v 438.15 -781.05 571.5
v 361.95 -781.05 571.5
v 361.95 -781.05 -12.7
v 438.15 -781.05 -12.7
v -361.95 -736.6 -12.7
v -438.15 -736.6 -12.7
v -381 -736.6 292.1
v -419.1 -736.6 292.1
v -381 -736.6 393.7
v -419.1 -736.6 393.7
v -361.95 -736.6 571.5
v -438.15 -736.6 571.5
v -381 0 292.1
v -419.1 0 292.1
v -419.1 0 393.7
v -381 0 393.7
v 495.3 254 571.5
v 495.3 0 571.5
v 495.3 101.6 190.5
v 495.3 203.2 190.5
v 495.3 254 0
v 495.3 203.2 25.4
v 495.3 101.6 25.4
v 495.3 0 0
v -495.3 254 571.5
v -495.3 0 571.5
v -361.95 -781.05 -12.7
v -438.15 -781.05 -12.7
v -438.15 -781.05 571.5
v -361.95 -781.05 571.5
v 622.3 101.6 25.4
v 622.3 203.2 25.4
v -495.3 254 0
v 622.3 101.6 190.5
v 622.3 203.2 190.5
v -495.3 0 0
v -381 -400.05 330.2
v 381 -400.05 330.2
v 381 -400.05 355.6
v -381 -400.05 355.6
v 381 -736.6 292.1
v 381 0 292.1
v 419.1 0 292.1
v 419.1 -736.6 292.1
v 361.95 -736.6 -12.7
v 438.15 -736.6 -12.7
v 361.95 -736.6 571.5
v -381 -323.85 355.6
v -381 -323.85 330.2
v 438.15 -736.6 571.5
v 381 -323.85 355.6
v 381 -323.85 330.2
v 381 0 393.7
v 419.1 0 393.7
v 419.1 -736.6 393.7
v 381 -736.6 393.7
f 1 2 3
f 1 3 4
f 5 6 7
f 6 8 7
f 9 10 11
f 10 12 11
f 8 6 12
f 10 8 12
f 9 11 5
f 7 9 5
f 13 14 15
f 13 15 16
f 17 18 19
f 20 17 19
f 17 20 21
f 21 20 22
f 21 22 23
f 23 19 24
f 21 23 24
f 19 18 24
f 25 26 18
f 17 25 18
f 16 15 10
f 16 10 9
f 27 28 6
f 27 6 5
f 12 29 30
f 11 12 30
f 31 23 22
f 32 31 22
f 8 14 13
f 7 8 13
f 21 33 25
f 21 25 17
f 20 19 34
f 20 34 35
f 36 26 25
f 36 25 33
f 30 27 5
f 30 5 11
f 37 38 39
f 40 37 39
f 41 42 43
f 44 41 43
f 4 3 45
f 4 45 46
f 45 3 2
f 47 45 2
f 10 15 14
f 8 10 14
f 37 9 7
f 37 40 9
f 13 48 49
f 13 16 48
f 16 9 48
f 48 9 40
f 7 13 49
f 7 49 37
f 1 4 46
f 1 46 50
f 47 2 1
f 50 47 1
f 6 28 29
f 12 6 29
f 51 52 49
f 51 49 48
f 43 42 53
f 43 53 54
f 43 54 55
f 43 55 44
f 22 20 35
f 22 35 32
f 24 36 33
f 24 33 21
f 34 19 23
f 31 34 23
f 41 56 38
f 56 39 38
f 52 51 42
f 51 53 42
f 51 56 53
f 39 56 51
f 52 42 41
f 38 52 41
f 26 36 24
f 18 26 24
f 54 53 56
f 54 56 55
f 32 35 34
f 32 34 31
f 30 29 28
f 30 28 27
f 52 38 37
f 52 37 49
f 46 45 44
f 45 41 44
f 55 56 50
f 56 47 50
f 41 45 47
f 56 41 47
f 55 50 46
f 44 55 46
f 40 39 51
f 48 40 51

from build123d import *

# Parameters (mm, degrees)
SKETCH1_W             = 990.6
SKETCH1_H             = 571.5
BOSS_EXTRUDE1_DEPTH   = 254
SKETCH3_W             = 165.1
SKETCH3_H             = 101.6
BOSS_EXTRUDE2_DEPTH   = 127
SKETCH4_W             = 38.1
SKETCH4_H             = 101.6
BOSS_EXTRUDE3_DEPTH   = 781.05
BOSS_EXTRUDE3_2_DEPTH = 781.05
SKETCH5_W             = 25.4
SKETCH5_H             = 76.2
BOSS_EXTRUDE4_DEPTH   = 762
SKETCH6_W             = 76.2
SKETCH6_H             = 584.2
BOSS_EXTRUDE5_DEPTH   = 44.45


with BuildPart() as part:
    # Sketch1 → Boss-Extrude1 (new body)
    with BuildSketch(Plane(origin=(0, 0, 0), x_dir=(1, 0, 0), z_dir=(0, 1, 0))):
        with Locations((0, -285.75)):
            Rectangle(SKETCH1_W, SKETCH1_H)
    extrude(amount=BOSS_EXTRUDE1_DEPTH)

    # Sketch3 → Boss-Extrude2 (add)
    with BuildSketch(Plane(origin=(495.3, 0, 0), x_dir=(0, 0, -1), z_dir=(1, 0, 0))):
        with Locations((-107.95, 152.4)):
            Rectangle(SKETCH3_W, SKETCH3_H)
    extrude(amount=BOSS_EXTRUDE2_DEPTH)


with BuildPart() as body_2:
    # Sketch4 → Boss-Extrude3 (new body)
    with BuildSketch(Plane(origin=(0, 0, 0), x_dir=(1, 0, 0), z_dir=(0, 1, 0))):
        with Locations((400.05, -342.9)):
            Rectangle(SKETCH4_W, SKETCH4_H)
    extrude(amount=-BOSS_EXTRUDE3_DEPTH)



with BuildPart() as body_3:
    # Sketch4 → Boss-Extrude3 2 (new body)
    with BuildSketch(Plane(origin=(0, 0, 0), x_dir=(1, 0, 0), z_dir=(0, 1, 0))):
        with Locations((-400.05, -342.9)):
            Rectangle(SKETCH4_W, SKETCH4_H)
    extrude(amount=-BOSS_EXTRUDE3_2_DEPTH)


with BuildPart() as body_2_1:
    add(body_2.part)

    add(body_3.part)  # Boss-Extrude4 merges body 3
    # Sketch5 → Boss-Extrude4 (add)
    with BuildSketch(Plane.ZY.offset(-381)):
        with Locations((342.9, -361.95)):
            Rectangle(SKETCH5_W, SKETCH5_H)
    extrude(amount=BOSS_EXTRUDE4_DEPTH)

    # Sketch6 → Boss-Extrude5 (add)
    with BuildSketch(Plane.XZ.offset(781.05)):
        with Locations((400.05, 279.4)):
            Rectangle(SKETCH6_W, SKETCH6_H)
        with Locations((-400.05, 279.4)):
            Rectangle(SKETCH6_W, SKETCH6_H)
    extrude(amount=-BOSS_EXTRUDE5_DEPTH)


solid = Compound([part.part, body_2_1.part])
